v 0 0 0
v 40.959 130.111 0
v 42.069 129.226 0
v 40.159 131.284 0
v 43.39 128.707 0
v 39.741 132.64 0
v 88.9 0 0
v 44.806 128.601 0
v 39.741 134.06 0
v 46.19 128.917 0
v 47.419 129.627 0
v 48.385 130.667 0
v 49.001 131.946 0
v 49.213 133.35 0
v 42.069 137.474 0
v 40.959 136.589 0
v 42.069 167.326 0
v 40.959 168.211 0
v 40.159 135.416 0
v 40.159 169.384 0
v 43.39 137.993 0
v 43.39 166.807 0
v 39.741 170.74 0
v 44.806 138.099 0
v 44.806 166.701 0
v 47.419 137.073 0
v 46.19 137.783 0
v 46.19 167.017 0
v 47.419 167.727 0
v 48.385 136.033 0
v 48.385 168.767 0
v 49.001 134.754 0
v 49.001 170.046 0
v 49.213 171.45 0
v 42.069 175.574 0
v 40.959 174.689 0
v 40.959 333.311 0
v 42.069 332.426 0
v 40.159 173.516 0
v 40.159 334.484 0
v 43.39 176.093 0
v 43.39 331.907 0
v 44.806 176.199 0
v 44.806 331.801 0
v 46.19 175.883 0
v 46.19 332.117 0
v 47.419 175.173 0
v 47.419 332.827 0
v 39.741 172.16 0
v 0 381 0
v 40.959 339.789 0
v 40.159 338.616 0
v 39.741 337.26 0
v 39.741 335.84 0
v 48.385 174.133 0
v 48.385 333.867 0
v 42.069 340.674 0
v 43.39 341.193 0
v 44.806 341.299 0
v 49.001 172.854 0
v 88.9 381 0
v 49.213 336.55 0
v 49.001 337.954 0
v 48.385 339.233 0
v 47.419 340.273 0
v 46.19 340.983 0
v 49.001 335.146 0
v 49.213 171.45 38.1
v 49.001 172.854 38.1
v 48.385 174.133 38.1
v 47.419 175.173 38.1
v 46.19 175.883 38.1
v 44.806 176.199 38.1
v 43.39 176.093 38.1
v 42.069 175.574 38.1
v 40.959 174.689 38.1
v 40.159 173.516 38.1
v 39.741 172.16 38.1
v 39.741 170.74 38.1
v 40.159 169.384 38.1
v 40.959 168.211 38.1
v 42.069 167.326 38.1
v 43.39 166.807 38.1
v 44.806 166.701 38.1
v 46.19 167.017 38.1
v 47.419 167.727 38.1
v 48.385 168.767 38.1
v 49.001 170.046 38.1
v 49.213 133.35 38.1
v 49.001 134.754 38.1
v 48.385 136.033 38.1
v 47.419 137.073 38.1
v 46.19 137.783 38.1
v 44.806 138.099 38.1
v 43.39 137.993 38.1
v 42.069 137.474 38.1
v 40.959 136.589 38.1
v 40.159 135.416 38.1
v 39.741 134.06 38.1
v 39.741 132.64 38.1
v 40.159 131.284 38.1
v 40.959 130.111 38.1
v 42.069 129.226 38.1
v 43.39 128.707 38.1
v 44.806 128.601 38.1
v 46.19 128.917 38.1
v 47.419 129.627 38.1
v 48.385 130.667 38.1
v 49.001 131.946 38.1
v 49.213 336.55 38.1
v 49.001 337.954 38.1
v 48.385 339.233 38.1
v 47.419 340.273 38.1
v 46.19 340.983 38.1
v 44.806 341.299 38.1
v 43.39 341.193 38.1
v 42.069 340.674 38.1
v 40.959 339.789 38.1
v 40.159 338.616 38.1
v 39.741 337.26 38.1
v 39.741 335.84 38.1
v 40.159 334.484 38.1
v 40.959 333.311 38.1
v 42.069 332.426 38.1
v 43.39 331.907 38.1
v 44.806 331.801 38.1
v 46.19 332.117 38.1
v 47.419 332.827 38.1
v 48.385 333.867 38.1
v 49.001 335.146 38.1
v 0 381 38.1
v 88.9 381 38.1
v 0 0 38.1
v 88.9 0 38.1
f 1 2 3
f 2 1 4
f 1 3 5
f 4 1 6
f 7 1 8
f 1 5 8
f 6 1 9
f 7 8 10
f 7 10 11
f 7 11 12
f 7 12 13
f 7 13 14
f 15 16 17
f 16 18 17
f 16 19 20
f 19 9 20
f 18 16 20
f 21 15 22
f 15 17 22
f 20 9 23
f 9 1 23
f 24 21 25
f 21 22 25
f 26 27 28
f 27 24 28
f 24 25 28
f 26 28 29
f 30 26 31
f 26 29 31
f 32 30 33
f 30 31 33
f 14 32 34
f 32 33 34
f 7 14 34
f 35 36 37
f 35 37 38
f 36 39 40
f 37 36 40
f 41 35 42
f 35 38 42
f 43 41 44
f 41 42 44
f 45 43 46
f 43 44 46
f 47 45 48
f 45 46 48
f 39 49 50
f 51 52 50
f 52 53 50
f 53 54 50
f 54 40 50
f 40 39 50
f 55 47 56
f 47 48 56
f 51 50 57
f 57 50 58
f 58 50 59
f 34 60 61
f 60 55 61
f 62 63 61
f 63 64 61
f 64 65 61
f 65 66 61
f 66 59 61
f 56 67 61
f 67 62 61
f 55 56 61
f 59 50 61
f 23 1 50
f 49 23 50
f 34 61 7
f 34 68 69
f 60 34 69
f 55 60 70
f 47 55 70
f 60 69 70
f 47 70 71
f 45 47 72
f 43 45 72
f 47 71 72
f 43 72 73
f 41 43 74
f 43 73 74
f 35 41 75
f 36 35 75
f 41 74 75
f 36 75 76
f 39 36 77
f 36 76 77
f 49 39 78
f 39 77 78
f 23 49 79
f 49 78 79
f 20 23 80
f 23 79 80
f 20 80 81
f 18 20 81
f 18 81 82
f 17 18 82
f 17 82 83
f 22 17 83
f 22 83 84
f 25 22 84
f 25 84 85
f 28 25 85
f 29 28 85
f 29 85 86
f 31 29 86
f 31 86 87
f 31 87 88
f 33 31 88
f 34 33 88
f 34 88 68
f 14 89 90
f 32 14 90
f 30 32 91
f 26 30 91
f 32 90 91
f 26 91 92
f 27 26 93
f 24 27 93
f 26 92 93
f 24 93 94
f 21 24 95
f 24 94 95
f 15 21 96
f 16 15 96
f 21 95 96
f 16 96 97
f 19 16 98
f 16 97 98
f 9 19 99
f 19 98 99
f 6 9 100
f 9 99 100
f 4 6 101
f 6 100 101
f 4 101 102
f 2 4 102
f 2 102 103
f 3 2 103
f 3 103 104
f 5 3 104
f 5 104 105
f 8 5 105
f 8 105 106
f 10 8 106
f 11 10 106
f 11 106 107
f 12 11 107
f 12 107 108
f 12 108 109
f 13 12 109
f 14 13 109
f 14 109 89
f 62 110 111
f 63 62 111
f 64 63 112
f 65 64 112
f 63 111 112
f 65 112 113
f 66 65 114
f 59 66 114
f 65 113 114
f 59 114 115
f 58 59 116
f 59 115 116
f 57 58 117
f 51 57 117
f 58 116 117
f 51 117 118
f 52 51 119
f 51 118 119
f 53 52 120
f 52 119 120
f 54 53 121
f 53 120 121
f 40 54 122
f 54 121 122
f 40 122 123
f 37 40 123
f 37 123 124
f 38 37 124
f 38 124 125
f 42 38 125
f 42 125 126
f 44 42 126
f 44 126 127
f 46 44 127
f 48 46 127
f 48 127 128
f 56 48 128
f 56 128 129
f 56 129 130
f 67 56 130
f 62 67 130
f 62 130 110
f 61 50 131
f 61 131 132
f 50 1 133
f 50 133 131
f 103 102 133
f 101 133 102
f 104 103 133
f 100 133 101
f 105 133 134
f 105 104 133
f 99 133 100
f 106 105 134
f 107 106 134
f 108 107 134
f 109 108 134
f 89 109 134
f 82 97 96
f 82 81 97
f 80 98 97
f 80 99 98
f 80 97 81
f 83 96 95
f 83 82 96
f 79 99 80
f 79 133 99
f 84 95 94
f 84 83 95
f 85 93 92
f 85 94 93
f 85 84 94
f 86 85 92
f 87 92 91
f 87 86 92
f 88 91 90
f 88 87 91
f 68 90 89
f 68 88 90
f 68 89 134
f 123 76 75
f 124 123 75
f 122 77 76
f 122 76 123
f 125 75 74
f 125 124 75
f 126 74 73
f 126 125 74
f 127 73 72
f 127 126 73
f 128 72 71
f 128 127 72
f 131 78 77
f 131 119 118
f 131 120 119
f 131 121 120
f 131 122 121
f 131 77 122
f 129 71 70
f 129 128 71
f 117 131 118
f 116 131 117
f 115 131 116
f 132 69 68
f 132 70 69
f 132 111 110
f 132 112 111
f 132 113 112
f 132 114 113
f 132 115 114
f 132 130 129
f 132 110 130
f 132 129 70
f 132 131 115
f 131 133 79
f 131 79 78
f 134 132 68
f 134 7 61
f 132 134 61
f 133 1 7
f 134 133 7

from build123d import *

# Parameters (mm, degrees)
SKETCH1_W           = 88.9
SKETCH1_H           = 381
BOSS_EXTRUDE1_DEPTH = 38.1
SKETCH2_R           = 4.7625
CUT_EXTRUDE1_DEPTH  = 394.08500353
SKETCH3_R           = 4.7625
CUT_EXTRUDE2_DEPTH  = 394.08500353
SKETCH4_R           = 4.7625
CUT_EXTRUDE3_DEPTH  = 394.08500353


with BuildPart() as part:
    # Sketch1 → Boss-Extrude1 (new body)
    with BuildSketch(Plane.XY):
        with Locations((44.45, 190.5)):
            Rectangle(SKETCH1_W, SKETCH1_H)
    extrude(amount=BOSS_EXTRUDE1_DEPTH)

    # Sketch2 → Cut-Extrude1 (cut, through all)
    with BuildSketch(Plane.XY.offset(38.1)):
        with Locations((44.45, 133.35)):
            Circle(SKETCH2_R)
    extrude(amount=-CUT_EXTRUDE1_DEPTH, mode=Mode.SUBTRACT)

    # Sketch3 → Cut-Extrude2 (cut, through all)
    with BuildSketch(Plane.XY.offset(38.1)):
        with Locations((44.45, 336.55)):
            Circle(SKETCH3_R)
    extrude(amount=-CUT_EXTRUDE2_DEPTH, mode=Mode.SUBTRACT)

    # Sketch4 → Cut-Extrude3 (cut, through all)
    with BuildSketch(Plane.XY.offset(38.1)):
        with Locations((44.45, 171.45)):
            Circle(SKETCH4_R)
    extrude(amount=-CUT_EXTRUDE3_DEPTH, mode=Mode.SUBTRACT)


solid = part.part
